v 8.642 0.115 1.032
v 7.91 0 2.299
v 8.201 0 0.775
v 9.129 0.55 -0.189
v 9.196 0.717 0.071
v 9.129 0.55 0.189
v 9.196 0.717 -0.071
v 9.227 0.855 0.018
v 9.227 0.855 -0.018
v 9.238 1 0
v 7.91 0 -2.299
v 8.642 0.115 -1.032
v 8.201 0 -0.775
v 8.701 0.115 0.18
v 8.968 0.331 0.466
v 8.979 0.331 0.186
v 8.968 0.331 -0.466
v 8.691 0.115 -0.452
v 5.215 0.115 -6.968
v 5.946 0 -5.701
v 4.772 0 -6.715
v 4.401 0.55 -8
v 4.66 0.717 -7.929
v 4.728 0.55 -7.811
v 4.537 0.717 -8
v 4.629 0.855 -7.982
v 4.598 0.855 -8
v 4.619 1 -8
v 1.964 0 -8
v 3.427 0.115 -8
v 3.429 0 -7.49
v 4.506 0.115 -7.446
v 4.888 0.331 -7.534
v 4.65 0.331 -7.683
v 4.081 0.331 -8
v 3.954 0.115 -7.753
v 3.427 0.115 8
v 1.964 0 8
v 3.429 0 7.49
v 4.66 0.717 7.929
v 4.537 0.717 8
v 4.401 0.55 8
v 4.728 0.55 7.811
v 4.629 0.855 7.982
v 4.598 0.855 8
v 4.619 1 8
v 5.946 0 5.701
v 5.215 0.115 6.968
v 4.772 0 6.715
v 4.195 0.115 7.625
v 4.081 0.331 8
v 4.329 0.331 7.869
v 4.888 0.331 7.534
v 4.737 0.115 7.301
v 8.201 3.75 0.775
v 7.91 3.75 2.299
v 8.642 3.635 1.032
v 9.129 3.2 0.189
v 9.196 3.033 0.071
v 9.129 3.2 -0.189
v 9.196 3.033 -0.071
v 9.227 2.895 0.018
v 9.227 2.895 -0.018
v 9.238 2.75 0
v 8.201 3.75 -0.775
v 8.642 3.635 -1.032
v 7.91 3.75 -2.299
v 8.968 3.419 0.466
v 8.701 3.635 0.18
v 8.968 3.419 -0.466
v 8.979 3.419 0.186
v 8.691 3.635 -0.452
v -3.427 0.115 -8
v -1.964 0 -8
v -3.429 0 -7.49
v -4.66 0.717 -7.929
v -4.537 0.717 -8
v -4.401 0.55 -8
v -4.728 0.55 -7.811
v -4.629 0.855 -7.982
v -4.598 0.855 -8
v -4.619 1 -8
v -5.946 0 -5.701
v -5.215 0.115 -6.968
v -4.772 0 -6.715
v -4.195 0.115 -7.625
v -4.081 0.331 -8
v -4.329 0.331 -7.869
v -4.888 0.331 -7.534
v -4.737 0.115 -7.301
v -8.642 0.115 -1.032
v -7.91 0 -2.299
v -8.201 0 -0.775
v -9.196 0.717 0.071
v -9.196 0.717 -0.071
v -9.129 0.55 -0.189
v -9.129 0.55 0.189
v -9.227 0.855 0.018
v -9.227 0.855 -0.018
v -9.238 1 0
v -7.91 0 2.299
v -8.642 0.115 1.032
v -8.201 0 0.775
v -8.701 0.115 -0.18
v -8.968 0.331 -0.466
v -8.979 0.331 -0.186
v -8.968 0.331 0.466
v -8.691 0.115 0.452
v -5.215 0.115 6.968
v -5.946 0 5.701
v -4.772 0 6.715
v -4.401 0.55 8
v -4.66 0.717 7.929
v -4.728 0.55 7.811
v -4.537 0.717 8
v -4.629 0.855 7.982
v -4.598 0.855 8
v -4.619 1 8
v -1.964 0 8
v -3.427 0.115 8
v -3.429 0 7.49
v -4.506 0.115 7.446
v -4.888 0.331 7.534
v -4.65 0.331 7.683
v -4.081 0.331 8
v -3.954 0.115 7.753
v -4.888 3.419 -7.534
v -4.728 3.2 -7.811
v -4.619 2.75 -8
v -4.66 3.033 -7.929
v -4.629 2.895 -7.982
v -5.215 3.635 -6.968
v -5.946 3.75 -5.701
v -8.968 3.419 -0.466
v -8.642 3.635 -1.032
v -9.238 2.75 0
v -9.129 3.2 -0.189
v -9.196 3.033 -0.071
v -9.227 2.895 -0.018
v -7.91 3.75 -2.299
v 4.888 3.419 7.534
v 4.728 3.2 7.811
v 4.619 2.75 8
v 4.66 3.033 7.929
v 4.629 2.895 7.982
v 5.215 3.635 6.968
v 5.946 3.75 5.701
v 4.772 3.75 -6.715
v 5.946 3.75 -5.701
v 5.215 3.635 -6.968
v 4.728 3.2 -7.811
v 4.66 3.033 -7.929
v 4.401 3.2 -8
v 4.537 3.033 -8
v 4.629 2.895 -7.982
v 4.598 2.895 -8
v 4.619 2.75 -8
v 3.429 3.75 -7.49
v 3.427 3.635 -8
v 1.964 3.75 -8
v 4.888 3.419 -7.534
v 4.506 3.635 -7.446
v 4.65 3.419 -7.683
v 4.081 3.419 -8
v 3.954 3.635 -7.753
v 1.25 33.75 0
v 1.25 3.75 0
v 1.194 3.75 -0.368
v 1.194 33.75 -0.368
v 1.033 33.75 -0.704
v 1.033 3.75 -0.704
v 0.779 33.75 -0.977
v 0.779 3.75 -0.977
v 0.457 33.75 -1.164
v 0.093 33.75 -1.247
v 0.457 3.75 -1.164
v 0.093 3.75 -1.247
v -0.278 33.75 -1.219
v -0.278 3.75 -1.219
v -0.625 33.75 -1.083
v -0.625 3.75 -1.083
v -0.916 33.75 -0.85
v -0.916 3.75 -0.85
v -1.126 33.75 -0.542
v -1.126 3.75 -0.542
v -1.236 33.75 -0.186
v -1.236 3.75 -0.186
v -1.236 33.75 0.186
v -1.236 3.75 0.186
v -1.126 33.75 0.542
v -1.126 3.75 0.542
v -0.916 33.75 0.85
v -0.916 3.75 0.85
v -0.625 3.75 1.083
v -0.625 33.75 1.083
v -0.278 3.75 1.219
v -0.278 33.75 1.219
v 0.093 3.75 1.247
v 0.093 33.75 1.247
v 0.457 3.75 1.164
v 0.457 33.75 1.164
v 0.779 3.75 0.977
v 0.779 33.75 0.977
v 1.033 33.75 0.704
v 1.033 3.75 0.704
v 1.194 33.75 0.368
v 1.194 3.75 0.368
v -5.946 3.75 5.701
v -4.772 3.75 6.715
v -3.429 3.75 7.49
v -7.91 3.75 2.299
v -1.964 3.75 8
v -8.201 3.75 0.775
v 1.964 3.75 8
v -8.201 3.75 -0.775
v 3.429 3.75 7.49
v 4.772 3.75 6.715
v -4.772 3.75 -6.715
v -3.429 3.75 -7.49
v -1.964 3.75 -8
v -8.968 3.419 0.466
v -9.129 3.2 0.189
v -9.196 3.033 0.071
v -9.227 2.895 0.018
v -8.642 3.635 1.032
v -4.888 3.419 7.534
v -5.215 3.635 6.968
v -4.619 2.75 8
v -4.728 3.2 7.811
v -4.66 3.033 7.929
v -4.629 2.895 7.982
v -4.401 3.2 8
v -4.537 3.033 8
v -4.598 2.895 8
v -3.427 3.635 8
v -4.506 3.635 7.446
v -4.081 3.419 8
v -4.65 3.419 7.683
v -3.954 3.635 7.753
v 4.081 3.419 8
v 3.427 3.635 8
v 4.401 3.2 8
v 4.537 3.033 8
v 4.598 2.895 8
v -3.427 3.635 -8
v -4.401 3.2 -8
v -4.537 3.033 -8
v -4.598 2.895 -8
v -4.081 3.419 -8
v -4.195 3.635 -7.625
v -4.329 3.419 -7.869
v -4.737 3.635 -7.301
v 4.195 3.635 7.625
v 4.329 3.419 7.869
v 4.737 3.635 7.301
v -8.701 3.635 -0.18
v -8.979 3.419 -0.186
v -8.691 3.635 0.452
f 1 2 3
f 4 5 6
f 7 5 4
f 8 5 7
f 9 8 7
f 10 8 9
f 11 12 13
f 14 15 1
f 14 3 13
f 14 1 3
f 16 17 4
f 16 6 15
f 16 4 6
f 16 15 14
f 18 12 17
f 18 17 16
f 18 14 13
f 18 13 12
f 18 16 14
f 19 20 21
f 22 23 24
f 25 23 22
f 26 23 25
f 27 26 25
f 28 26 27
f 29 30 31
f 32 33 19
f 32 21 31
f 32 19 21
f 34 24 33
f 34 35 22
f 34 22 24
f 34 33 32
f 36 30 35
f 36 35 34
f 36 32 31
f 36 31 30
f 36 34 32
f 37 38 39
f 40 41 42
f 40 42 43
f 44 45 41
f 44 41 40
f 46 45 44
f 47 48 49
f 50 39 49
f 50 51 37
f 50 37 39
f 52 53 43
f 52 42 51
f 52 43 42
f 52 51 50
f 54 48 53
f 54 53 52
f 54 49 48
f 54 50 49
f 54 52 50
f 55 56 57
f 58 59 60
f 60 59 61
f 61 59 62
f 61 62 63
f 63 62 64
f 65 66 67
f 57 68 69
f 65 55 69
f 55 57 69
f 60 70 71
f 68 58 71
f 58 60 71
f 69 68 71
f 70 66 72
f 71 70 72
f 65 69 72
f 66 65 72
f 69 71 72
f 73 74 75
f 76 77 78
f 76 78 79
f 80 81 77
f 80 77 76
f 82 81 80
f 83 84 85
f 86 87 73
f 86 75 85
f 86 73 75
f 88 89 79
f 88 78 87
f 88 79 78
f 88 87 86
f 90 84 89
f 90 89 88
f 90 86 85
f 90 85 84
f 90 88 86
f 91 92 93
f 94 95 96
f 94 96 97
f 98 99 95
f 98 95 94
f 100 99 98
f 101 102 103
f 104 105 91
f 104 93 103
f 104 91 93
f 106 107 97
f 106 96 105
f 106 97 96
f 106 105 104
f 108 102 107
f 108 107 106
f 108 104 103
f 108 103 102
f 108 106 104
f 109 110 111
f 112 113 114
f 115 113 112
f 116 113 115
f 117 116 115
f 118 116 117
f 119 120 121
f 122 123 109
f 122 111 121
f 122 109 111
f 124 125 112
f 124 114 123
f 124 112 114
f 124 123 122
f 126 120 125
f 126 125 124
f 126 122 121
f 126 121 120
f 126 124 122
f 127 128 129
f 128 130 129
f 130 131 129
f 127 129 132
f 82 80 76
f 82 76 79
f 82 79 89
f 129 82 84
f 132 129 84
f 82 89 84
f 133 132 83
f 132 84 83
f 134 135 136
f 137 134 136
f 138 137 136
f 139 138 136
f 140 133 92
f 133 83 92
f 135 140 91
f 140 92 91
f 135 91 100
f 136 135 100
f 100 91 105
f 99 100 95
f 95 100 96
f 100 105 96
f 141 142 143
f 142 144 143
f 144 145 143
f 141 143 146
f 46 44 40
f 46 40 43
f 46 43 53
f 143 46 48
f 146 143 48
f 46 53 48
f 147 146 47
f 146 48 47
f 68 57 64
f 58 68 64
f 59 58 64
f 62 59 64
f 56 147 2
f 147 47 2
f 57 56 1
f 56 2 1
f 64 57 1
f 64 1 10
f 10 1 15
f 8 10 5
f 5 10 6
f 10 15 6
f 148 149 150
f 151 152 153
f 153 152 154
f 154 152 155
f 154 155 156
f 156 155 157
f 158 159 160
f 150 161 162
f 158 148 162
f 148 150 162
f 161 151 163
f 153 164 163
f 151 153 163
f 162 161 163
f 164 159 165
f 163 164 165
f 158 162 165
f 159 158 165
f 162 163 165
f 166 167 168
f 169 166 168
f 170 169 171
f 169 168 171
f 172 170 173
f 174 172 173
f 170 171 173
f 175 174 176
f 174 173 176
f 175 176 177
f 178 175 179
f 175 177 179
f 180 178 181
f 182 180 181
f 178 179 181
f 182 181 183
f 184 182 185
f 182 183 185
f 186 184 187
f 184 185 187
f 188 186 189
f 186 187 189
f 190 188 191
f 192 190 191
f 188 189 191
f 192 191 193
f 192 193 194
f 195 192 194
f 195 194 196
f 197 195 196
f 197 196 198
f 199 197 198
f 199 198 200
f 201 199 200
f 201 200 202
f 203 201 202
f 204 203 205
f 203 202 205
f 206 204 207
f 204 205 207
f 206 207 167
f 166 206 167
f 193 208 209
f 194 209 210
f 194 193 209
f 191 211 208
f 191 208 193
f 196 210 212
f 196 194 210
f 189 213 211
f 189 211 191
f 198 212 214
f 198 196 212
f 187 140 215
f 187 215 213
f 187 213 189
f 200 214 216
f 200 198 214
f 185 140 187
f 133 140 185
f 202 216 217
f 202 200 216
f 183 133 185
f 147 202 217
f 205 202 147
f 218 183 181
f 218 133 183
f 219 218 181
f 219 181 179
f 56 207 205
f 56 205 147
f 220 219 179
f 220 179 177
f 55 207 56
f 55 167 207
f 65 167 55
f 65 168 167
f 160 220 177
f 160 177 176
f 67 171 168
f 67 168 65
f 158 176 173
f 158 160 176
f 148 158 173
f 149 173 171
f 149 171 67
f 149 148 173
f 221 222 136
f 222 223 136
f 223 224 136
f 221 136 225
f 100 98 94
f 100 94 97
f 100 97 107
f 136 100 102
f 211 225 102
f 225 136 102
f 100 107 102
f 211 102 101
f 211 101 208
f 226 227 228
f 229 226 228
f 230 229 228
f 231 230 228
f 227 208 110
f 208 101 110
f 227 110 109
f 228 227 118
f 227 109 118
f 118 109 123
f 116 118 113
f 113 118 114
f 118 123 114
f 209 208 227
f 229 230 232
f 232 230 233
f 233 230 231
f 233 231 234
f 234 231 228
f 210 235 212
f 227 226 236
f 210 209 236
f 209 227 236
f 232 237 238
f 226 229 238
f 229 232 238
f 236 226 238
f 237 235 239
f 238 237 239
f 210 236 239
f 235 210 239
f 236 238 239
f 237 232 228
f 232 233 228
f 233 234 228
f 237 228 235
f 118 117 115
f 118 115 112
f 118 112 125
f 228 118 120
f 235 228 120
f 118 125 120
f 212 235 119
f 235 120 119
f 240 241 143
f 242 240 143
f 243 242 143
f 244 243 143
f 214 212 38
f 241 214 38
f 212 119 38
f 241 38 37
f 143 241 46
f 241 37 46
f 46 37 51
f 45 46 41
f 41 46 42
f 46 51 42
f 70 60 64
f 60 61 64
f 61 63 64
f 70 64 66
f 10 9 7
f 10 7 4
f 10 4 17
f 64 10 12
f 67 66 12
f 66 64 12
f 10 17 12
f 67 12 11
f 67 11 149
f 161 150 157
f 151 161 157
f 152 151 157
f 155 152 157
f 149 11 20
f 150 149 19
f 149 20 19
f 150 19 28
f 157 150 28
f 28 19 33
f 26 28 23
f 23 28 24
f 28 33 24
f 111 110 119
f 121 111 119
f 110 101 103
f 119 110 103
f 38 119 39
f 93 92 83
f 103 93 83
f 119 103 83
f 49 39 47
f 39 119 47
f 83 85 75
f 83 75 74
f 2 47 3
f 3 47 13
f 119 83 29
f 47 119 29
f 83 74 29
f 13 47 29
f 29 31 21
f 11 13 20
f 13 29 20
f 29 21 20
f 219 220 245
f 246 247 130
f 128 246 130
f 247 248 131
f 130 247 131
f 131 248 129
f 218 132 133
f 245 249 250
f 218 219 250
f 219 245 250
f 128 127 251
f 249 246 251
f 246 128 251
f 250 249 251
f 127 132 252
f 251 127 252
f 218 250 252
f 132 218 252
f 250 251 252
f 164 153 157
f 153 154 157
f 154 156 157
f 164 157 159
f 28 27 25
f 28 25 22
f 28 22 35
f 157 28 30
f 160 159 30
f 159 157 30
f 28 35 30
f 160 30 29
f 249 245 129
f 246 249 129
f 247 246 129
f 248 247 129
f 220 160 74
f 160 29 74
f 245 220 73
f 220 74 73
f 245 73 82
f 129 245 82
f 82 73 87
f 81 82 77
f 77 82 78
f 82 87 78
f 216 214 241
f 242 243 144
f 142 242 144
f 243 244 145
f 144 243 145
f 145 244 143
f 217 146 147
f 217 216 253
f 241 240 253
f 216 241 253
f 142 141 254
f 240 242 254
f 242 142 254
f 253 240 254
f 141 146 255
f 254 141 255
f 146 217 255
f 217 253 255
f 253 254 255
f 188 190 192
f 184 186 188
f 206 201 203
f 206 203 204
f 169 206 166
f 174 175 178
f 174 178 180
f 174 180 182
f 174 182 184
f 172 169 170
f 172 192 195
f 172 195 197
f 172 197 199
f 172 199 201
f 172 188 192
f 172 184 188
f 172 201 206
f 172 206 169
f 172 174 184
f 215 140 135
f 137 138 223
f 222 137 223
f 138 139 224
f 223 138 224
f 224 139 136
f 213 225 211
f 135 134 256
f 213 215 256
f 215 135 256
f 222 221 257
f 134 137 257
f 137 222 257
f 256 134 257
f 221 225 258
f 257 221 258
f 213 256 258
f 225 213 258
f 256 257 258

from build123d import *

# Parameters (mm, degrees)
BOSS_EXTRUDE1_DEPTH = 3.75
SKETCH4_R           = 1.25
BOSS_EXTRUDE2_DEPTH = 30


with BuildPart() as part:
    # Sketch1 → Boss-Extrude1 (new body)
    with BuildSketch(Plane(origin=(0, 0, 0), x_dir=(1, 0, 0), z_dir=(0, 1, 0))):
        Polygon((9.237604307, 0), (4.618802154, 8), (-4.618802154, 8), (-9.237604307, 0), (-4.618802154, -8), (4.618802154, -8), align=None)
    extrude(amount=BOSS_EXTRUDE1_DEPTH)

    # Sketch2 → Cut-Revolve1 (revolve, cut)
    with BuildSketch(Plane.XY):
        with BuildLine():
            Line((9.237604307, 2.75), (9.237604307, 3.75))
            Line((9.237604307, 3.75), (8.237604307, 3.75))
            ThreePointArc((8.237604307, 3.75), (8.944711088, 3.457106781), (9.237604307, 2.75))
        make_face()
    revolve(axis=Axis((0, 0, 0), (0, 1, 0)), mode=Mode.SUBTRACT)

    # Sketch3 → Cut-Revolve2 (revolve, cut)
    with BuildSketch(Plane.XY):
        with BuildLine():
            Line((9.237604307, 0), (8.237604307, 0))
            ThreePointArc((8.237604307, 0), (8.944711088, 0.292893219), (9.237604307, 1))
            Line((9.237604307, 1), (9.237604307, 0))
        make_face()
    revolve(axis=Axis((0, 0, 0), (0, 1, 0)), mode=Mode.SUBTRACT)

    # Sketch4 → Boss-Extrude2 (add)
    with BuildSketch(Plane(origin=(0, 3.75, 0), x_dir=(1, 0, 0), z_dir=(0, 1, 0))):
        Circle(SKETCH4_R)
    extrude(amount=BOSS_EXTRUDE2_DEPTH)


solid = part.part
